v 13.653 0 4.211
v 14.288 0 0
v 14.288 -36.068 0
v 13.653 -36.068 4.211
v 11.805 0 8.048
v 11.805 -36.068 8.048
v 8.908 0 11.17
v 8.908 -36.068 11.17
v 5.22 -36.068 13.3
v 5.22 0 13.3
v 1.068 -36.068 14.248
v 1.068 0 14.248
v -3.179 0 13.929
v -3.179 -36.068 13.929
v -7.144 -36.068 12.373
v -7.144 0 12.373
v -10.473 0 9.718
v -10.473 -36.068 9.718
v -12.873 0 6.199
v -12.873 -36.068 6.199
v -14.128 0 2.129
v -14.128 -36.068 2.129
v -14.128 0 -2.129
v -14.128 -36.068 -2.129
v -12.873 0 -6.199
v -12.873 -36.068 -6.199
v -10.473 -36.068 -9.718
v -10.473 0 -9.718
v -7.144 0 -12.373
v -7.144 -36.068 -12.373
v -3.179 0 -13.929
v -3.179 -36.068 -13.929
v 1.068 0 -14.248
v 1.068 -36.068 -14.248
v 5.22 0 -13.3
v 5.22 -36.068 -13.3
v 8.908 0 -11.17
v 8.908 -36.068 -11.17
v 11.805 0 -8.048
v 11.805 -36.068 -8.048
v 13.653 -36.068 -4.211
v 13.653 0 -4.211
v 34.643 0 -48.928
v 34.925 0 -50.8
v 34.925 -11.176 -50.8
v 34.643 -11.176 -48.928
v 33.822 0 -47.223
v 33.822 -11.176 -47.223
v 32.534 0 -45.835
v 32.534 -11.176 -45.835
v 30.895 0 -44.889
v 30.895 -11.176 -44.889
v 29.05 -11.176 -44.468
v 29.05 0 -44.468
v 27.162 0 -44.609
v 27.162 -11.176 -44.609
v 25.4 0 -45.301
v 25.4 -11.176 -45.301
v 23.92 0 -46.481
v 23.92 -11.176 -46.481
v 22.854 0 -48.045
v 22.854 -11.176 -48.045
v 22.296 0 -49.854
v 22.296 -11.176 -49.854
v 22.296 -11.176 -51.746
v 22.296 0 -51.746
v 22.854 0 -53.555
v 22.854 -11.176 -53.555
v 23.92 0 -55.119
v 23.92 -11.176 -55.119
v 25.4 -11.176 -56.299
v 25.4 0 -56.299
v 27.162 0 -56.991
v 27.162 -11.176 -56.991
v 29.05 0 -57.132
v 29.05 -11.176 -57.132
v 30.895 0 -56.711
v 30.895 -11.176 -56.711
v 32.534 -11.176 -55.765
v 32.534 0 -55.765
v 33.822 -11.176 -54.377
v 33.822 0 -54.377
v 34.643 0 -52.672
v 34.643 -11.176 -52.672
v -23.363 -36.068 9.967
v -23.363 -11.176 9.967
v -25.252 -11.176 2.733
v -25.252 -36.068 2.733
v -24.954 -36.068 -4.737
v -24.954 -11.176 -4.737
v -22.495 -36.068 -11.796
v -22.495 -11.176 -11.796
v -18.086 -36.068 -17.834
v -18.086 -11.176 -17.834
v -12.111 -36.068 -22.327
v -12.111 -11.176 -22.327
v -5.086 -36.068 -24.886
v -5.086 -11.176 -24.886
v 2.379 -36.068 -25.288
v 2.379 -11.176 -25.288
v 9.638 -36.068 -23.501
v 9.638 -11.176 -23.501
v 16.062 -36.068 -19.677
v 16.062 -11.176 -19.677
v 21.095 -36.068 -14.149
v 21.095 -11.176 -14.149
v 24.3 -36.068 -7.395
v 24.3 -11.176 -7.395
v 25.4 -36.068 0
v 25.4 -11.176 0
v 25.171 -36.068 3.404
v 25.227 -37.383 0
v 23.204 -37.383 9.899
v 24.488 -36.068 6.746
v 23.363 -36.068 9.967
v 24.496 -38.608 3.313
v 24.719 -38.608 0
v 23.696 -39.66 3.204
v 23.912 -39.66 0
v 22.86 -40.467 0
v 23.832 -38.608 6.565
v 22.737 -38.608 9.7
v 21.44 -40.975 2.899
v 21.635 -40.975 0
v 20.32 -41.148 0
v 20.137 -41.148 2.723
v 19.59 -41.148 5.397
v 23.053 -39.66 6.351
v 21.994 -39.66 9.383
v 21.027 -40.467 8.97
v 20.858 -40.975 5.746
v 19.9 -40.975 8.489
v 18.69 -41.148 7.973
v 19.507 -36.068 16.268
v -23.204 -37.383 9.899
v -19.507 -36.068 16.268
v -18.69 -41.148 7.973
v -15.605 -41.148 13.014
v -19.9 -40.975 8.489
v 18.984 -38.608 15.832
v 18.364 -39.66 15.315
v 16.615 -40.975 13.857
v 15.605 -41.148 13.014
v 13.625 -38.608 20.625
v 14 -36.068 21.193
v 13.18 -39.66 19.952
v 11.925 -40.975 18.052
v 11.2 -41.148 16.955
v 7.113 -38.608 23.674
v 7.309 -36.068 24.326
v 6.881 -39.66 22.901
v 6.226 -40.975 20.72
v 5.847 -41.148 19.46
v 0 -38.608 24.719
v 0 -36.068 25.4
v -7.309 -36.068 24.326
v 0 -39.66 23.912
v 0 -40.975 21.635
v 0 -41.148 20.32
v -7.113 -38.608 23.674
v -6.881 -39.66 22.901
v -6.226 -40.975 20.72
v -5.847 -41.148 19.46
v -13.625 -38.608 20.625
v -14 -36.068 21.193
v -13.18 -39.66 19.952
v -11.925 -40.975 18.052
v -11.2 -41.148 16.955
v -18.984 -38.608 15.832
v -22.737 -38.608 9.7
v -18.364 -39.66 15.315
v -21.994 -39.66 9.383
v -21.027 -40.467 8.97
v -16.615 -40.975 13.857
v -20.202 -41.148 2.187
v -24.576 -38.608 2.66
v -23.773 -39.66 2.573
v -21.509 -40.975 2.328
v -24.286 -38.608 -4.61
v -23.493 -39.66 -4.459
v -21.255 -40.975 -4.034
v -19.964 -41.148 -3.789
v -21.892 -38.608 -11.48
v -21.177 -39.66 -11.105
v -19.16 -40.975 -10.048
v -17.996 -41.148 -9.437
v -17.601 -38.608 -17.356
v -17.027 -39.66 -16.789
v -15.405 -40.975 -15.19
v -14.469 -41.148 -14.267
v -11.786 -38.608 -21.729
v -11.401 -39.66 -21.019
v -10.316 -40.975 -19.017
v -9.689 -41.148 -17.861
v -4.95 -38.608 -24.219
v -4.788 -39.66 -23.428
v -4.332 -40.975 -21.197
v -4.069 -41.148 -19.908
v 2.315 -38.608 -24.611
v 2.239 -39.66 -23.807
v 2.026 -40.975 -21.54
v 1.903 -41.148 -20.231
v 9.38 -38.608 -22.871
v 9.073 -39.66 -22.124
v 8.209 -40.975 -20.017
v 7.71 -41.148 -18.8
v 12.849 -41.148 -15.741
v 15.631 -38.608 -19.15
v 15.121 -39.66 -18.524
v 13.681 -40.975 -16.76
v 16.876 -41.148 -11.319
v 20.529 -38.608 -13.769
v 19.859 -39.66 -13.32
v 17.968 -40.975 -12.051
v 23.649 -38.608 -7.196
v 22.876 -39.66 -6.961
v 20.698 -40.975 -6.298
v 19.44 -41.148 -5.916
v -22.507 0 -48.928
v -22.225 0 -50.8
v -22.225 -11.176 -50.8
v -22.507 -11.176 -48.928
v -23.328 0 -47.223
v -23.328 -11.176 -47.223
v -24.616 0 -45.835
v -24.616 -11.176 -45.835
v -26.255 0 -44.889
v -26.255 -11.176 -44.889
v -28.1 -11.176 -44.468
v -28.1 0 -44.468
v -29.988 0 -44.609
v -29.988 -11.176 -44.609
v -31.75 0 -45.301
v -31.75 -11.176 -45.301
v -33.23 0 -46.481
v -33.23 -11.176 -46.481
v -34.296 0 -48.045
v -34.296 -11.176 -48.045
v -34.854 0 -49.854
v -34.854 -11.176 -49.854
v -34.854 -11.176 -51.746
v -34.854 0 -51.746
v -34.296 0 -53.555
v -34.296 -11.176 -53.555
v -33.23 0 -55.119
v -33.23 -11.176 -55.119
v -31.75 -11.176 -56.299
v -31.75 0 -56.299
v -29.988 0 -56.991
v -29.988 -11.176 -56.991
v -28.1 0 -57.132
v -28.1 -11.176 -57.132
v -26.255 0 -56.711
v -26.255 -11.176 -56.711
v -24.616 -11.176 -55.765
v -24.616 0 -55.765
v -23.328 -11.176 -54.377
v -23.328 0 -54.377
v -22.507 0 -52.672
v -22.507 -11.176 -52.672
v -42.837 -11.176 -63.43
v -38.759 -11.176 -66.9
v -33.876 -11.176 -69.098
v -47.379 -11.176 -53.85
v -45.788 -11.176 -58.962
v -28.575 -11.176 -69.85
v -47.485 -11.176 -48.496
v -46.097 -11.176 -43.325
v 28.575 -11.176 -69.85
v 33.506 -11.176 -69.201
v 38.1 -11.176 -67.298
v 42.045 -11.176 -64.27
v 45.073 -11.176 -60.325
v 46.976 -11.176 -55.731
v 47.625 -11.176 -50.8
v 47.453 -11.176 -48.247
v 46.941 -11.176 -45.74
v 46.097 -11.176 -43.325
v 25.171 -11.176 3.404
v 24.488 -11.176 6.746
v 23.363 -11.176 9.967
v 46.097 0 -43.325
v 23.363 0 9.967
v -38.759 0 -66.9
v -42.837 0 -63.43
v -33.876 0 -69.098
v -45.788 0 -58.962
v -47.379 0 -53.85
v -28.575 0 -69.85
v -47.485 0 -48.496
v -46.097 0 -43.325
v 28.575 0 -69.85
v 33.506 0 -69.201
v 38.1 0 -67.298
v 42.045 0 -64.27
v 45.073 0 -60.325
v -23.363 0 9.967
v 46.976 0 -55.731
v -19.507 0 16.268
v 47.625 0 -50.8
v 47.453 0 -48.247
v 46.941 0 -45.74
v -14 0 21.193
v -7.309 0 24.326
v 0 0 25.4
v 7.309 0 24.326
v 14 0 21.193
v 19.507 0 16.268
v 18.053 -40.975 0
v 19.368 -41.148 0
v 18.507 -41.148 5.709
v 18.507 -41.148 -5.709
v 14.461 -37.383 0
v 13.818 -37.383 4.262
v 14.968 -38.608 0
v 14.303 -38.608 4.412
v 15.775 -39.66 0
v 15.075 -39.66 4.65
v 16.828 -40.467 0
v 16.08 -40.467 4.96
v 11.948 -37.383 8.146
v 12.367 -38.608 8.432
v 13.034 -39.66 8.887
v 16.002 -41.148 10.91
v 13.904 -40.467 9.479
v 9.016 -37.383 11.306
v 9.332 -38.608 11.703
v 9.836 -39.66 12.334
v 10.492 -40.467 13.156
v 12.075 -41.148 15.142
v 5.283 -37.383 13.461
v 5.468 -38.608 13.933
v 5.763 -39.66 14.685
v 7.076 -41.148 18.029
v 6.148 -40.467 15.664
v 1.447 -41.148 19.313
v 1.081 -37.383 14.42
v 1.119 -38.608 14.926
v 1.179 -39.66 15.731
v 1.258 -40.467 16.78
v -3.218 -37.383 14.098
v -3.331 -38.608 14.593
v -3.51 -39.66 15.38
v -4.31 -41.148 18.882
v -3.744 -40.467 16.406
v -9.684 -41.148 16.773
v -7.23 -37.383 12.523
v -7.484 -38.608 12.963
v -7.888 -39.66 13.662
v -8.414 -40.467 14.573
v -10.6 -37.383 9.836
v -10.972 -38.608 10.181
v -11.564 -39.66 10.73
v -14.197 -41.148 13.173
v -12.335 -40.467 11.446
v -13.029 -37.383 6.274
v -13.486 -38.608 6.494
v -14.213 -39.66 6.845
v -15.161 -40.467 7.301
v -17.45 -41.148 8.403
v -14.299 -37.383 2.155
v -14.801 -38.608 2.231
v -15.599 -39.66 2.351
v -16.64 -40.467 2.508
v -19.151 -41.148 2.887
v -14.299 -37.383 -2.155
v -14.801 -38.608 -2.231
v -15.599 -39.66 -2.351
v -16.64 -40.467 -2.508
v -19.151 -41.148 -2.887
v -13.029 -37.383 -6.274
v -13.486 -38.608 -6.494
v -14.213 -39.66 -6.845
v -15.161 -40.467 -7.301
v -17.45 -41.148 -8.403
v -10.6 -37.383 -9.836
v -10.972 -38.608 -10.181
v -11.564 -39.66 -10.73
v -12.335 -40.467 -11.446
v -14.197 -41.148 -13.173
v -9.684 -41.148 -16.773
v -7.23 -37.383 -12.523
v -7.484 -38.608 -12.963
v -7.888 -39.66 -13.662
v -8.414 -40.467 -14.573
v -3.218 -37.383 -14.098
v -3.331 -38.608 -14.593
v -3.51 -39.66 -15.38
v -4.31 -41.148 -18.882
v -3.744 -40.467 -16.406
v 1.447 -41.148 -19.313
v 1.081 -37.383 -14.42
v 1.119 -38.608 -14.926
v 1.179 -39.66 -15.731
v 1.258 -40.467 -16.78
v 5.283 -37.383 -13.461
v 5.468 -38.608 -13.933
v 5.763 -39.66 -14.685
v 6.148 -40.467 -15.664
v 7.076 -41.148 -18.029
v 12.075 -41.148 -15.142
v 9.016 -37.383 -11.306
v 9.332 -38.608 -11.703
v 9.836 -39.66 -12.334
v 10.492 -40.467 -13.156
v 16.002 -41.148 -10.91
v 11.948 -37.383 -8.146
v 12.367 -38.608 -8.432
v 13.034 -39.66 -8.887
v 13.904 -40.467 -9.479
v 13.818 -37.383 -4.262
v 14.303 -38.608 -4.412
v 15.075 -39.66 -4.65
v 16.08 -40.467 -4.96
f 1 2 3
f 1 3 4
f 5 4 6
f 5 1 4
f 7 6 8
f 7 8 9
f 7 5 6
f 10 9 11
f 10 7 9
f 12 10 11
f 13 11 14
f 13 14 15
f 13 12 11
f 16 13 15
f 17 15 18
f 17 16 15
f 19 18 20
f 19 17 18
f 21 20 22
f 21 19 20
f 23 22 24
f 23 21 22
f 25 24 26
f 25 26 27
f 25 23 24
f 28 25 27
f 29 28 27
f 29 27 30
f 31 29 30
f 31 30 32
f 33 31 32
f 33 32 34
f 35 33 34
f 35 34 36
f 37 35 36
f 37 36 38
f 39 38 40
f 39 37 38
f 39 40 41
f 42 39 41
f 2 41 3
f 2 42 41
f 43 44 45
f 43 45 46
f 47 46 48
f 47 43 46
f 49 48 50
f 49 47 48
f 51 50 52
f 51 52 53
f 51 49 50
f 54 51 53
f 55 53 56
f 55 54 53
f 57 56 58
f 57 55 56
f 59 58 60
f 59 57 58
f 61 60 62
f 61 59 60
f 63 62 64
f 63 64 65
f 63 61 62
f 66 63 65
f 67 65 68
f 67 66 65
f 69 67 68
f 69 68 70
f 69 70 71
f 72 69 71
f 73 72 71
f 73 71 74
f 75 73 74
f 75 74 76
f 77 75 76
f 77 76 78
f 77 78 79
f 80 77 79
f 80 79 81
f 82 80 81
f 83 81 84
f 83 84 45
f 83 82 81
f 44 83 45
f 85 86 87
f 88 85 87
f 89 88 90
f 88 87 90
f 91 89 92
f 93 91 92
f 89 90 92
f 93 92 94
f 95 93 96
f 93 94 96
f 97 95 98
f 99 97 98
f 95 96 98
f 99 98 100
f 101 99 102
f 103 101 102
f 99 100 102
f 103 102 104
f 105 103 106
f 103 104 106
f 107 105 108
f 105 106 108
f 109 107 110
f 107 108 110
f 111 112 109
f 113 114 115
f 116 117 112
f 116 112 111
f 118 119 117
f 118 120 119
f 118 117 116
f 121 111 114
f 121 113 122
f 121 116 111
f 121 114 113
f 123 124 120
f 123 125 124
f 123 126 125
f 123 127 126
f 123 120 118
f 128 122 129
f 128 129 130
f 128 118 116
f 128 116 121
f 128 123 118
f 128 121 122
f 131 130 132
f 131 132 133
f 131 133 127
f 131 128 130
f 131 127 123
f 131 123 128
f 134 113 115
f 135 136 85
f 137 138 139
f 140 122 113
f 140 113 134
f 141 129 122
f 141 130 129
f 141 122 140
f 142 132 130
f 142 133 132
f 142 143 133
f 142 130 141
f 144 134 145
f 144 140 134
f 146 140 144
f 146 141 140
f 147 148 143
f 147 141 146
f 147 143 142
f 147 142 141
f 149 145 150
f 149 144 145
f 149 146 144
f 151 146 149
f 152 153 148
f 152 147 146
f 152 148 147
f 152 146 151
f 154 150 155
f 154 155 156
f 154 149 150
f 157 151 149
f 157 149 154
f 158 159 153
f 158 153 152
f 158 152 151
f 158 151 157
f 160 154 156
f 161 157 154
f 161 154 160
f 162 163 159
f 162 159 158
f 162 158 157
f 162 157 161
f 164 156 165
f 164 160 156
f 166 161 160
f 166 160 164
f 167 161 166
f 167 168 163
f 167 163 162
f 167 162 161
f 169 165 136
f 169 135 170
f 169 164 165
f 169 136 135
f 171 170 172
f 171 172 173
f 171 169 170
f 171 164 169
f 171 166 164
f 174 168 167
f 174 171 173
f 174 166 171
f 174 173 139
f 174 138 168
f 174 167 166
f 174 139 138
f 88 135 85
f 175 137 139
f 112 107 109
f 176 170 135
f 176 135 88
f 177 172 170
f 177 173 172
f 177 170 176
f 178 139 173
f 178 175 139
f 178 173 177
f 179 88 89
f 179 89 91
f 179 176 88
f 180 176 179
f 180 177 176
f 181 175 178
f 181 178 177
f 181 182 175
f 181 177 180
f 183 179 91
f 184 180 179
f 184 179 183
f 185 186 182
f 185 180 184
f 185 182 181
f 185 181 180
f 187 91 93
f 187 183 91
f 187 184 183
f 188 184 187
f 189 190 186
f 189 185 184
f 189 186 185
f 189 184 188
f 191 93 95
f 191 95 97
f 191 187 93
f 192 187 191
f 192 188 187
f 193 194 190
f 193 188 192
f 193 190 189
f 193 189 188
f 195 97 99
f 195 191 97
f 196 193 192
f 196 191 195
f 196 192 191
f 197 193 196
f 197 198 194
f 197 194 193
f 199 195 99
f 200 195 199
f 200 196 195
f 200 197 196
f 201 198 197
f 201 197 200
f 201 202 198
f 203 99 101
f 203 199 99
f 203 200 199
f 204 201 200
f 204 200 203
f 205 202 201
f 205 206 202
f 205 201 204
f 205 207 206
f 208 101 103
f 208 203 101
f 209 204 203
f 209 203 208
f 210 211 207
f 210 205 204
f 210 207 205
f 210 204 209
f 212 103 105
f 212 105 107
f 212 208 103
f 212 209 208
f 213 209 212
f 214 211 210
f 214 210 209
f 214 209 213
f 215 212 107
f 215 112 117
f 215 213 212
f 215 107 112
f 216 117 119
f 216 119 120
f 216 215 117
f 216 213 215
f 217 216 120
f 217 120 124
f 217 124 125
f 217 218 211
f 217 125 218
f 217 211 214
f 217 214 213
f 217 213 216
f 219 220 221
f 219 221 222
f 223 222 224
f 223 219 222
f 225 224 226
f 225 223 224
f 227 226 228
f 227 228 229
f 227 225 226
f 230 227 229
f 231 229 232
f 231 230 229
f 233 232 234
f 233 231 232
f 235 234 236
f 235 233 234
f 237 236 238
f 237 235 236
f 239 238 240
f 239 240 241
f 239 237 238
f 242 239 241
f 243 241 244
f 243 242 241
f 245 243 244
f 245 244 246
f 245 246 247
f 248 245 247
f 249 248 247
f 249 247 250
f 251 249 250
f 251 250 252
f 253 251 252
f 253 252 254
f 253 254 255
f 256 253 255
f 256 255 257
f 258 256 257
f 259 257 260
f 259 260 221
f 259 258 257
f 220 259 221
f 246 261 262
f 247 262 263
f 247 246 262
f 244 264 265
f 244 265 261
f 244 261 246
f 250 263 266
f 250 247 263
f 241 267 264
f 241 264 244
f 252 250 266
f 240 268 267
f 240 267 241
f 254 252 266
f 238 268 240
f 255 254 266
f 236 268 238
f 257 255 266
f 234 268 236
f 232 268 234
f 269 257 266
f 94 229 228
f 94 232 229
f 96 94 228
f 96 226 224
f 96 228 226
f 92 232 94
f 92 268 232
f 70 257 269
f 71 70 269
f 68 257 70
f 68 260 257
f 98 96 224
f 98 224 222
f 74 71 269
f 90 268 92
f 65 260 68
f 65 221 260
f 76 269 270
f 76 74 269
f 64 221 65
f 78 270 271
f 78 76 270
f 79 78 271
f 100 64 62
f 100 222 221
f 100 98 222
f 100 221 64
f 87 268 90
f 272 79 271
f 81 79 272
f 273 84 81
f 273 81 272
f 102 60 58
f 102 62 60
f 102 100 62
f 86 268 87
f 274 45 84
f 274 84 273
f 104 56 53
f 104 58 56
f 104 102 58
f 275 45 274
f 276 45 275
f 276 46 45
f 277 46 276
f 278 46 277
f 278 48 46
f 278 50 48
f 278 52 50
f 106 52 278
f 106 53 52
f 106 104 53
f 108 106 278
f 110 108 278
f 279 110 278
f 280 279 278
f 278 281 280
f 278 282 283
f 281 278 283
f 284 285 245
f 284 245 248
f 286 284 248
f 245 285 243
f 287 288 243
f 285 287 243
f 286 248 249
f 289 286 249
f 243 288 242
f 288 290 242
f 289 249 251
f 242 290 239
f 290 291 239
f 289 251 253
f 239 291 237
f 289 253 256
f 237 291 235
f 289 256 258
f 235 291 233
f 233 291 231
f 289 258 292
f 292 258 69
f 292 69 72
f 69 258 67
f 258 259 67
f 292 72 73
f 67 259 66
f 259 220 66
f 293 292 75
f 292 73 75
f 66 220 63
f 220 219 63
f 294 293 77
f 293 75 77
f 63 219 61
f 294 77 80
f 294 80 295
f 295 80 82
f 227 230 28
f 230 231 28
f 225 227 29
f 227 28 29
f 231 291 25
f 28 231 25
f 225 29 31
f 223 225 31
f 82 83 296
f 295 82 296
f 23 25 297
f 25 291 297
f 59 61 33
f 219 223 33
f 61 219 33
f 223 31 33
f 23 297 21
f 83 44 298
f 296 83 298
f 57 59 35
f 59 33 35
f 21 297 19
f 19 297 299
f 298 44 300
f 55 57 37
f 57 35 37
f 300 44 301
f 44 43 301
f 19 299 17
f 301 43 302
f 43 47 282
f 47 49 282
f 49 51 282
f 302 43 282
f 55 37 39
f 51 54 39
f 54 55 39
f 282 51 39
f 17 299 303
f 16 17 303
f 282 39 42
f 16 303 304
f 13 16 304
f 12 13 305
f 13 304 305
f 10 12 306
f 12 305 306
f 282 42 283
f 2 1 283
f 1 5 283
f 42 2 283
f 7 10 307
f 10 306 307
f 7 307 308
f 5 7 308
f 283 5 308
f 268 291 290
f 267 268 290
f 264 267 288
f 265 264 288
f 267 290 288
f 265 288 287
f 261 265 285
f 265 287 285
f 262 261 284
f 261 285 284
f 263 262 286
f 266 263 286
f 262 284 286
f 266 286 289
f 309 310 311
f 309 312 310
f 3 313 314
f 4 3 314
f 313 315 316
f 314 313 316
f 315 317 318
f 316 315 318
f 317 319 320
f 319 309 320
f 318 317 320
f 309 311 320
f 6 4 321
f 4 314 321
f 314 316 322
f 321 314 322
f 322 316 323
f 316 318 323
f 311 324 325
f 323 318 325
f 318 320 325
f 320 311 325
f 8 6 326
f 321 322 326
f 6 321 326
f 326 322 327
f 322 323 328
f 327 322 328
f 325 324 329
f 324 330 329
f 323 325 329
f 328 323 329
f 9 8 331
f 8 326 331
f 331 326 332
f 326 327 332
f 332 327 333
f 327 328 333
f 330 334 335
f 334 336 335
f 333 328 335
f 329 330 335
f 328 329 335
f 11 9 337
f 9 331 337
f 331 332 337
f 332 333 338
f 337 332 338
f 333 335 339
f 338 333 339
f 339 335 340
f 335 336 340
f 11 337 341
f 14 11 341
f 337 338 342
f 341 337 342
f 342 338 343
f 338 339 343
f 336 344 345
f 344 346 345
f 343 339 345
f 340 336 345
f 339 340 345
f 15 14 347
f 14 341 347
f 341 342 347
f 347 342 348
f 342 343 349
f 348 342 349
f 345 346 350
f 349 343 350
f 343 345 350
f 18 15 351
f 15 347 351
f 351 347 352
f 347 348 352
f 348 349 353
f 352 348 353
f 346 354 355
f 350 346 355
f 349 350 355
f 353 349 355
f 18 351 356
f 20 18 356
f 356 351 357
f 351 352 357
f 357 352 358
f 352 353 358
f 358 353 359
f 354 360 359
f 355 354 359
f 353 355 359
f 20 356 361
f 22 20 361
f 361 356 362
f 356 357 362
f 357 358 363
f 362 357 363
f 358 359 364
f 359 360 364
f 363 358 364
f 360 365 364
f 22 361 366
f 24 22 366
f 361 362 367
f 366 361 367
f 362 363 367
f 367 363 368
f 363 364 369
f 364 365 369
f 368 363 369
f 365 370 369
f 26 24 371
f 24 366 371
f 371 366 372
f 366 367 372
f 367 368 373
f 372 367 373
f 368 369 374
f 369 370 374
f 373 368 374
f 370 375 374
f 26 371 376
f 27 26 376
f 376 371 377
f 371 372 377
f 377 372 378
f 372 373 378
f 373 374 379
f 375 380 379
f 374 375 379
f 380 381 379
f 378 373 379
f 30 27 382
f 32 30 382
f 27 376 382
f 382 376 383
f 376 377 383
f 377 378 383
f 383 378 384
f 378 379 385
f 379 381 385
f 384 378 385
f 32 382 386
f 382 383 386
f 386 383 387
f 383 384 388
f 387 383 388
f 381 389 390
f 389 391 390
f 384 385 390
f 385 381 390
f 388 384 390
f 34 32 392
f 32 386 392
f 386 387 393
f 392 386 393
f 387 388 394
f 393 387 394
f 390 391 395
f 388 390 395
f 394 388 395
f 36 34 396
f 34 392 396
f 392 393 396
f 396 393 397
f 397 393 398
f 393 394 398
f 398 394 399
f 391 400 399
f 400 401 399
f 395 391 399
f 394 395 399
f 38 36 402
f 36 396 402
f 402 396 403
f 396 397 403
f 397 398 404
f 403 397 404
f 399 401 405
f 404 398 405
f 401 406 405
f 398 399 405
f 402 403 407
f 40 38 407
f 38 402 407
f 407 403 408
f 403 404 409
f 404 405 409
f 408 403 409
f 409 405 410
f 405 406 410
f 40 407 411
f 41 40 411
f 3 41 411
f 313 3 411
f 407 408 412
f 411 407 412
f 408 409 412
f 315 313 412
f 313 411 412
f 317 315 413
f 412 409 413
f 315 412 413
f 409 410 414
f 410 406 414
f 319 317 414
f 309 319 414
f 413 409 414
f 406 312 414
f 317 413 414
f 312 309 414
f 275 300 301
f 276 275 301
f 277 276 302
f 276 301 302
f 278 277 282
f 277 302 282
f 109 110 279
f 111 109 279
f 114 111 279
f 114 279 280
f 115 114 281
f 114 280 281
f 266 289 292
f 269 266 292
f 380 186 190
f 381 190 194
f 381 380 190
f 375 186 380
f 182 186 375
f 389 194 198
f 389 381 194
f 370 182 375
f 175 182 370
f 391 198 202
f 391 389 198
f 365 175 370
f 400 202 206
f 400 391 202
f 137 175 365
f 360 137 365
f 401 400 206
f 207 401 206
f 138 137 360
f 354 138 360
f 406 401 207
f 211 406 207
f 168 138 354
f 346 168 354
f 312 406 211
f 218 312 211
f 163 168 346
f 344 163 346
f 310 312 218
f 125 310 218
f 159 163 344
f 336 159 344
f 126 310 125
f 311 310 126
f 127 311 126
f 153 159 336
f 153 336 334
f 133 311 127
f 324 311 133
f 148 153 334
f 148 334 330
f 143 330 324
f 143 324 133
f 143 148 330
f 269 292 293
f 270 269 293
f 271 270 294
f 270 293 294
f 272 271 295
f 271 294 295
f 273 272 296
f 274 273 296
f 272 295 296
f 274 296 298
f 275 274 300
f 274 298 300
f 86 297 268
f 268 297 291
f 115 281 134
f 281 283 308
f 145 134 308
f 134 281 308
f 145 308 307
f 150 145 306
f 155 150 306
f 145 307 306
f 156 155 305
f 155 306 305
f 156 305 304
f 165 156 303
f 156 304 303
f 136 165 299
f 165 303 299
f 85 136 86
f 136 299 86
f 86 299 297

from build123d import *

# Parameters (mm, degrees)
F0_R     = 14.2875
F1_DEPTH = 41.148
F2_R     = 5.08
F3_DEPTH = 11.176
F0_R_2   = 6.35
F4_DEPTH = 11.176
F5_DEPTH = 11.176


with BuildPart() as f1:
    # F0 (on Front) → F1 (new body)
    with BuildSketch(Plane.XZ):
        with BuildLine():
            ThreePointArc((-23.36292, 9.966643), (-5.086346, -24.88552), (25.4, 0))
            ThreePointArc((25.4, 0), (24.88552, 5.086346), (23.36292, 9.966643))
            ThreePointArc((23.36292, 9.966643), (0, 25.4), (-23.36292, 9.966643))
        make_face()
        Circle(F0_R, mode=Mode.SUBTRACT)
    extrude(amount=F1_DEPTH)

    # F2
    f2_edges = [f1.edges().sort_by_distance(p)[0] for p in [
        (-25.4, -41.148, 0),
        (-14.2875, -41.148, 0),
    ]]
    fillet(f2_edges, radius=F2_R)

    # F0 (on Front) → F3 (join)
    with BuildSketch(Plane.XZ):
        with BuildLine():
            ThreePointArc((23.36292, 9.966643), (24.88552, 5.086346), (25.4, 0))
            ThreePointArc((25.4, 0), (-5.086346, -24.88552), (-23.36292, 9.966643))
            Line((-23.36292, 9.966643), (-46.09719, -43.325018))
            ThreePointArc((-46.09719, -43.325018), (-24.760241, -32.13586), (-9.525, -50.8))
            ThreePointArc((-9.525, -50.8), (-15.104616, -64.270384), (-28.575, -69.85))
            Line((-28.575, -69.85), (28.575, -69.85))
            ThreePointArc((28.575, -69.85), (12.680018, -40.299903), (46.09719, -43.325018))
            Line((46.09719, -43.325018), (23.36292, 9.966643))
        make_face()
    extrude(amount=F3_DEPTH)

    # F0 (on Front) → F4 (join)
    with BuildSketch(Plane.XZ):
        with BuildLine():
            ThreePointArc((-9.525, -50.8), (-24.760241, -32.13586), (-46.09719, -43.325018))
            ThreePointArc((-46.09719, -43.325018), (-44.469982, -61.300097), (-28.575, -69.85))
            ThreePointArc((-28.575, -69.85), (-15.104616, -64.270384), (-9.525, -50.8))
        make_face()
        with Locations((-28.575, -50.8)):
            Circle(F0_R_2, mode=Mode.SUBTRACT)
    extrude(amount=F4_DEPTH)

    # F0 (on Front) → F5 (join)
    with BuildSketch(Plane.XZ):
        with BuildLine():
            ThreePointArc((47.625, -50.8), (47.23914, -46.985241), (46.09719, -43.325018))
            ThreePointArc((46.09719, -43.325018), (12.680018, -40.299903), (28.575, -69.85))
            ThreePointArc((28.575, -69.85), (42.045384, -64.270384), (47.625, -50.8))
        make_face()
        with Locations((28.575, -50.8)):
            Circle(F0_R_2, mode=Mode.SUBTRACT)
    extrude(amount=F5_DEPTH)


solid = f1.part
